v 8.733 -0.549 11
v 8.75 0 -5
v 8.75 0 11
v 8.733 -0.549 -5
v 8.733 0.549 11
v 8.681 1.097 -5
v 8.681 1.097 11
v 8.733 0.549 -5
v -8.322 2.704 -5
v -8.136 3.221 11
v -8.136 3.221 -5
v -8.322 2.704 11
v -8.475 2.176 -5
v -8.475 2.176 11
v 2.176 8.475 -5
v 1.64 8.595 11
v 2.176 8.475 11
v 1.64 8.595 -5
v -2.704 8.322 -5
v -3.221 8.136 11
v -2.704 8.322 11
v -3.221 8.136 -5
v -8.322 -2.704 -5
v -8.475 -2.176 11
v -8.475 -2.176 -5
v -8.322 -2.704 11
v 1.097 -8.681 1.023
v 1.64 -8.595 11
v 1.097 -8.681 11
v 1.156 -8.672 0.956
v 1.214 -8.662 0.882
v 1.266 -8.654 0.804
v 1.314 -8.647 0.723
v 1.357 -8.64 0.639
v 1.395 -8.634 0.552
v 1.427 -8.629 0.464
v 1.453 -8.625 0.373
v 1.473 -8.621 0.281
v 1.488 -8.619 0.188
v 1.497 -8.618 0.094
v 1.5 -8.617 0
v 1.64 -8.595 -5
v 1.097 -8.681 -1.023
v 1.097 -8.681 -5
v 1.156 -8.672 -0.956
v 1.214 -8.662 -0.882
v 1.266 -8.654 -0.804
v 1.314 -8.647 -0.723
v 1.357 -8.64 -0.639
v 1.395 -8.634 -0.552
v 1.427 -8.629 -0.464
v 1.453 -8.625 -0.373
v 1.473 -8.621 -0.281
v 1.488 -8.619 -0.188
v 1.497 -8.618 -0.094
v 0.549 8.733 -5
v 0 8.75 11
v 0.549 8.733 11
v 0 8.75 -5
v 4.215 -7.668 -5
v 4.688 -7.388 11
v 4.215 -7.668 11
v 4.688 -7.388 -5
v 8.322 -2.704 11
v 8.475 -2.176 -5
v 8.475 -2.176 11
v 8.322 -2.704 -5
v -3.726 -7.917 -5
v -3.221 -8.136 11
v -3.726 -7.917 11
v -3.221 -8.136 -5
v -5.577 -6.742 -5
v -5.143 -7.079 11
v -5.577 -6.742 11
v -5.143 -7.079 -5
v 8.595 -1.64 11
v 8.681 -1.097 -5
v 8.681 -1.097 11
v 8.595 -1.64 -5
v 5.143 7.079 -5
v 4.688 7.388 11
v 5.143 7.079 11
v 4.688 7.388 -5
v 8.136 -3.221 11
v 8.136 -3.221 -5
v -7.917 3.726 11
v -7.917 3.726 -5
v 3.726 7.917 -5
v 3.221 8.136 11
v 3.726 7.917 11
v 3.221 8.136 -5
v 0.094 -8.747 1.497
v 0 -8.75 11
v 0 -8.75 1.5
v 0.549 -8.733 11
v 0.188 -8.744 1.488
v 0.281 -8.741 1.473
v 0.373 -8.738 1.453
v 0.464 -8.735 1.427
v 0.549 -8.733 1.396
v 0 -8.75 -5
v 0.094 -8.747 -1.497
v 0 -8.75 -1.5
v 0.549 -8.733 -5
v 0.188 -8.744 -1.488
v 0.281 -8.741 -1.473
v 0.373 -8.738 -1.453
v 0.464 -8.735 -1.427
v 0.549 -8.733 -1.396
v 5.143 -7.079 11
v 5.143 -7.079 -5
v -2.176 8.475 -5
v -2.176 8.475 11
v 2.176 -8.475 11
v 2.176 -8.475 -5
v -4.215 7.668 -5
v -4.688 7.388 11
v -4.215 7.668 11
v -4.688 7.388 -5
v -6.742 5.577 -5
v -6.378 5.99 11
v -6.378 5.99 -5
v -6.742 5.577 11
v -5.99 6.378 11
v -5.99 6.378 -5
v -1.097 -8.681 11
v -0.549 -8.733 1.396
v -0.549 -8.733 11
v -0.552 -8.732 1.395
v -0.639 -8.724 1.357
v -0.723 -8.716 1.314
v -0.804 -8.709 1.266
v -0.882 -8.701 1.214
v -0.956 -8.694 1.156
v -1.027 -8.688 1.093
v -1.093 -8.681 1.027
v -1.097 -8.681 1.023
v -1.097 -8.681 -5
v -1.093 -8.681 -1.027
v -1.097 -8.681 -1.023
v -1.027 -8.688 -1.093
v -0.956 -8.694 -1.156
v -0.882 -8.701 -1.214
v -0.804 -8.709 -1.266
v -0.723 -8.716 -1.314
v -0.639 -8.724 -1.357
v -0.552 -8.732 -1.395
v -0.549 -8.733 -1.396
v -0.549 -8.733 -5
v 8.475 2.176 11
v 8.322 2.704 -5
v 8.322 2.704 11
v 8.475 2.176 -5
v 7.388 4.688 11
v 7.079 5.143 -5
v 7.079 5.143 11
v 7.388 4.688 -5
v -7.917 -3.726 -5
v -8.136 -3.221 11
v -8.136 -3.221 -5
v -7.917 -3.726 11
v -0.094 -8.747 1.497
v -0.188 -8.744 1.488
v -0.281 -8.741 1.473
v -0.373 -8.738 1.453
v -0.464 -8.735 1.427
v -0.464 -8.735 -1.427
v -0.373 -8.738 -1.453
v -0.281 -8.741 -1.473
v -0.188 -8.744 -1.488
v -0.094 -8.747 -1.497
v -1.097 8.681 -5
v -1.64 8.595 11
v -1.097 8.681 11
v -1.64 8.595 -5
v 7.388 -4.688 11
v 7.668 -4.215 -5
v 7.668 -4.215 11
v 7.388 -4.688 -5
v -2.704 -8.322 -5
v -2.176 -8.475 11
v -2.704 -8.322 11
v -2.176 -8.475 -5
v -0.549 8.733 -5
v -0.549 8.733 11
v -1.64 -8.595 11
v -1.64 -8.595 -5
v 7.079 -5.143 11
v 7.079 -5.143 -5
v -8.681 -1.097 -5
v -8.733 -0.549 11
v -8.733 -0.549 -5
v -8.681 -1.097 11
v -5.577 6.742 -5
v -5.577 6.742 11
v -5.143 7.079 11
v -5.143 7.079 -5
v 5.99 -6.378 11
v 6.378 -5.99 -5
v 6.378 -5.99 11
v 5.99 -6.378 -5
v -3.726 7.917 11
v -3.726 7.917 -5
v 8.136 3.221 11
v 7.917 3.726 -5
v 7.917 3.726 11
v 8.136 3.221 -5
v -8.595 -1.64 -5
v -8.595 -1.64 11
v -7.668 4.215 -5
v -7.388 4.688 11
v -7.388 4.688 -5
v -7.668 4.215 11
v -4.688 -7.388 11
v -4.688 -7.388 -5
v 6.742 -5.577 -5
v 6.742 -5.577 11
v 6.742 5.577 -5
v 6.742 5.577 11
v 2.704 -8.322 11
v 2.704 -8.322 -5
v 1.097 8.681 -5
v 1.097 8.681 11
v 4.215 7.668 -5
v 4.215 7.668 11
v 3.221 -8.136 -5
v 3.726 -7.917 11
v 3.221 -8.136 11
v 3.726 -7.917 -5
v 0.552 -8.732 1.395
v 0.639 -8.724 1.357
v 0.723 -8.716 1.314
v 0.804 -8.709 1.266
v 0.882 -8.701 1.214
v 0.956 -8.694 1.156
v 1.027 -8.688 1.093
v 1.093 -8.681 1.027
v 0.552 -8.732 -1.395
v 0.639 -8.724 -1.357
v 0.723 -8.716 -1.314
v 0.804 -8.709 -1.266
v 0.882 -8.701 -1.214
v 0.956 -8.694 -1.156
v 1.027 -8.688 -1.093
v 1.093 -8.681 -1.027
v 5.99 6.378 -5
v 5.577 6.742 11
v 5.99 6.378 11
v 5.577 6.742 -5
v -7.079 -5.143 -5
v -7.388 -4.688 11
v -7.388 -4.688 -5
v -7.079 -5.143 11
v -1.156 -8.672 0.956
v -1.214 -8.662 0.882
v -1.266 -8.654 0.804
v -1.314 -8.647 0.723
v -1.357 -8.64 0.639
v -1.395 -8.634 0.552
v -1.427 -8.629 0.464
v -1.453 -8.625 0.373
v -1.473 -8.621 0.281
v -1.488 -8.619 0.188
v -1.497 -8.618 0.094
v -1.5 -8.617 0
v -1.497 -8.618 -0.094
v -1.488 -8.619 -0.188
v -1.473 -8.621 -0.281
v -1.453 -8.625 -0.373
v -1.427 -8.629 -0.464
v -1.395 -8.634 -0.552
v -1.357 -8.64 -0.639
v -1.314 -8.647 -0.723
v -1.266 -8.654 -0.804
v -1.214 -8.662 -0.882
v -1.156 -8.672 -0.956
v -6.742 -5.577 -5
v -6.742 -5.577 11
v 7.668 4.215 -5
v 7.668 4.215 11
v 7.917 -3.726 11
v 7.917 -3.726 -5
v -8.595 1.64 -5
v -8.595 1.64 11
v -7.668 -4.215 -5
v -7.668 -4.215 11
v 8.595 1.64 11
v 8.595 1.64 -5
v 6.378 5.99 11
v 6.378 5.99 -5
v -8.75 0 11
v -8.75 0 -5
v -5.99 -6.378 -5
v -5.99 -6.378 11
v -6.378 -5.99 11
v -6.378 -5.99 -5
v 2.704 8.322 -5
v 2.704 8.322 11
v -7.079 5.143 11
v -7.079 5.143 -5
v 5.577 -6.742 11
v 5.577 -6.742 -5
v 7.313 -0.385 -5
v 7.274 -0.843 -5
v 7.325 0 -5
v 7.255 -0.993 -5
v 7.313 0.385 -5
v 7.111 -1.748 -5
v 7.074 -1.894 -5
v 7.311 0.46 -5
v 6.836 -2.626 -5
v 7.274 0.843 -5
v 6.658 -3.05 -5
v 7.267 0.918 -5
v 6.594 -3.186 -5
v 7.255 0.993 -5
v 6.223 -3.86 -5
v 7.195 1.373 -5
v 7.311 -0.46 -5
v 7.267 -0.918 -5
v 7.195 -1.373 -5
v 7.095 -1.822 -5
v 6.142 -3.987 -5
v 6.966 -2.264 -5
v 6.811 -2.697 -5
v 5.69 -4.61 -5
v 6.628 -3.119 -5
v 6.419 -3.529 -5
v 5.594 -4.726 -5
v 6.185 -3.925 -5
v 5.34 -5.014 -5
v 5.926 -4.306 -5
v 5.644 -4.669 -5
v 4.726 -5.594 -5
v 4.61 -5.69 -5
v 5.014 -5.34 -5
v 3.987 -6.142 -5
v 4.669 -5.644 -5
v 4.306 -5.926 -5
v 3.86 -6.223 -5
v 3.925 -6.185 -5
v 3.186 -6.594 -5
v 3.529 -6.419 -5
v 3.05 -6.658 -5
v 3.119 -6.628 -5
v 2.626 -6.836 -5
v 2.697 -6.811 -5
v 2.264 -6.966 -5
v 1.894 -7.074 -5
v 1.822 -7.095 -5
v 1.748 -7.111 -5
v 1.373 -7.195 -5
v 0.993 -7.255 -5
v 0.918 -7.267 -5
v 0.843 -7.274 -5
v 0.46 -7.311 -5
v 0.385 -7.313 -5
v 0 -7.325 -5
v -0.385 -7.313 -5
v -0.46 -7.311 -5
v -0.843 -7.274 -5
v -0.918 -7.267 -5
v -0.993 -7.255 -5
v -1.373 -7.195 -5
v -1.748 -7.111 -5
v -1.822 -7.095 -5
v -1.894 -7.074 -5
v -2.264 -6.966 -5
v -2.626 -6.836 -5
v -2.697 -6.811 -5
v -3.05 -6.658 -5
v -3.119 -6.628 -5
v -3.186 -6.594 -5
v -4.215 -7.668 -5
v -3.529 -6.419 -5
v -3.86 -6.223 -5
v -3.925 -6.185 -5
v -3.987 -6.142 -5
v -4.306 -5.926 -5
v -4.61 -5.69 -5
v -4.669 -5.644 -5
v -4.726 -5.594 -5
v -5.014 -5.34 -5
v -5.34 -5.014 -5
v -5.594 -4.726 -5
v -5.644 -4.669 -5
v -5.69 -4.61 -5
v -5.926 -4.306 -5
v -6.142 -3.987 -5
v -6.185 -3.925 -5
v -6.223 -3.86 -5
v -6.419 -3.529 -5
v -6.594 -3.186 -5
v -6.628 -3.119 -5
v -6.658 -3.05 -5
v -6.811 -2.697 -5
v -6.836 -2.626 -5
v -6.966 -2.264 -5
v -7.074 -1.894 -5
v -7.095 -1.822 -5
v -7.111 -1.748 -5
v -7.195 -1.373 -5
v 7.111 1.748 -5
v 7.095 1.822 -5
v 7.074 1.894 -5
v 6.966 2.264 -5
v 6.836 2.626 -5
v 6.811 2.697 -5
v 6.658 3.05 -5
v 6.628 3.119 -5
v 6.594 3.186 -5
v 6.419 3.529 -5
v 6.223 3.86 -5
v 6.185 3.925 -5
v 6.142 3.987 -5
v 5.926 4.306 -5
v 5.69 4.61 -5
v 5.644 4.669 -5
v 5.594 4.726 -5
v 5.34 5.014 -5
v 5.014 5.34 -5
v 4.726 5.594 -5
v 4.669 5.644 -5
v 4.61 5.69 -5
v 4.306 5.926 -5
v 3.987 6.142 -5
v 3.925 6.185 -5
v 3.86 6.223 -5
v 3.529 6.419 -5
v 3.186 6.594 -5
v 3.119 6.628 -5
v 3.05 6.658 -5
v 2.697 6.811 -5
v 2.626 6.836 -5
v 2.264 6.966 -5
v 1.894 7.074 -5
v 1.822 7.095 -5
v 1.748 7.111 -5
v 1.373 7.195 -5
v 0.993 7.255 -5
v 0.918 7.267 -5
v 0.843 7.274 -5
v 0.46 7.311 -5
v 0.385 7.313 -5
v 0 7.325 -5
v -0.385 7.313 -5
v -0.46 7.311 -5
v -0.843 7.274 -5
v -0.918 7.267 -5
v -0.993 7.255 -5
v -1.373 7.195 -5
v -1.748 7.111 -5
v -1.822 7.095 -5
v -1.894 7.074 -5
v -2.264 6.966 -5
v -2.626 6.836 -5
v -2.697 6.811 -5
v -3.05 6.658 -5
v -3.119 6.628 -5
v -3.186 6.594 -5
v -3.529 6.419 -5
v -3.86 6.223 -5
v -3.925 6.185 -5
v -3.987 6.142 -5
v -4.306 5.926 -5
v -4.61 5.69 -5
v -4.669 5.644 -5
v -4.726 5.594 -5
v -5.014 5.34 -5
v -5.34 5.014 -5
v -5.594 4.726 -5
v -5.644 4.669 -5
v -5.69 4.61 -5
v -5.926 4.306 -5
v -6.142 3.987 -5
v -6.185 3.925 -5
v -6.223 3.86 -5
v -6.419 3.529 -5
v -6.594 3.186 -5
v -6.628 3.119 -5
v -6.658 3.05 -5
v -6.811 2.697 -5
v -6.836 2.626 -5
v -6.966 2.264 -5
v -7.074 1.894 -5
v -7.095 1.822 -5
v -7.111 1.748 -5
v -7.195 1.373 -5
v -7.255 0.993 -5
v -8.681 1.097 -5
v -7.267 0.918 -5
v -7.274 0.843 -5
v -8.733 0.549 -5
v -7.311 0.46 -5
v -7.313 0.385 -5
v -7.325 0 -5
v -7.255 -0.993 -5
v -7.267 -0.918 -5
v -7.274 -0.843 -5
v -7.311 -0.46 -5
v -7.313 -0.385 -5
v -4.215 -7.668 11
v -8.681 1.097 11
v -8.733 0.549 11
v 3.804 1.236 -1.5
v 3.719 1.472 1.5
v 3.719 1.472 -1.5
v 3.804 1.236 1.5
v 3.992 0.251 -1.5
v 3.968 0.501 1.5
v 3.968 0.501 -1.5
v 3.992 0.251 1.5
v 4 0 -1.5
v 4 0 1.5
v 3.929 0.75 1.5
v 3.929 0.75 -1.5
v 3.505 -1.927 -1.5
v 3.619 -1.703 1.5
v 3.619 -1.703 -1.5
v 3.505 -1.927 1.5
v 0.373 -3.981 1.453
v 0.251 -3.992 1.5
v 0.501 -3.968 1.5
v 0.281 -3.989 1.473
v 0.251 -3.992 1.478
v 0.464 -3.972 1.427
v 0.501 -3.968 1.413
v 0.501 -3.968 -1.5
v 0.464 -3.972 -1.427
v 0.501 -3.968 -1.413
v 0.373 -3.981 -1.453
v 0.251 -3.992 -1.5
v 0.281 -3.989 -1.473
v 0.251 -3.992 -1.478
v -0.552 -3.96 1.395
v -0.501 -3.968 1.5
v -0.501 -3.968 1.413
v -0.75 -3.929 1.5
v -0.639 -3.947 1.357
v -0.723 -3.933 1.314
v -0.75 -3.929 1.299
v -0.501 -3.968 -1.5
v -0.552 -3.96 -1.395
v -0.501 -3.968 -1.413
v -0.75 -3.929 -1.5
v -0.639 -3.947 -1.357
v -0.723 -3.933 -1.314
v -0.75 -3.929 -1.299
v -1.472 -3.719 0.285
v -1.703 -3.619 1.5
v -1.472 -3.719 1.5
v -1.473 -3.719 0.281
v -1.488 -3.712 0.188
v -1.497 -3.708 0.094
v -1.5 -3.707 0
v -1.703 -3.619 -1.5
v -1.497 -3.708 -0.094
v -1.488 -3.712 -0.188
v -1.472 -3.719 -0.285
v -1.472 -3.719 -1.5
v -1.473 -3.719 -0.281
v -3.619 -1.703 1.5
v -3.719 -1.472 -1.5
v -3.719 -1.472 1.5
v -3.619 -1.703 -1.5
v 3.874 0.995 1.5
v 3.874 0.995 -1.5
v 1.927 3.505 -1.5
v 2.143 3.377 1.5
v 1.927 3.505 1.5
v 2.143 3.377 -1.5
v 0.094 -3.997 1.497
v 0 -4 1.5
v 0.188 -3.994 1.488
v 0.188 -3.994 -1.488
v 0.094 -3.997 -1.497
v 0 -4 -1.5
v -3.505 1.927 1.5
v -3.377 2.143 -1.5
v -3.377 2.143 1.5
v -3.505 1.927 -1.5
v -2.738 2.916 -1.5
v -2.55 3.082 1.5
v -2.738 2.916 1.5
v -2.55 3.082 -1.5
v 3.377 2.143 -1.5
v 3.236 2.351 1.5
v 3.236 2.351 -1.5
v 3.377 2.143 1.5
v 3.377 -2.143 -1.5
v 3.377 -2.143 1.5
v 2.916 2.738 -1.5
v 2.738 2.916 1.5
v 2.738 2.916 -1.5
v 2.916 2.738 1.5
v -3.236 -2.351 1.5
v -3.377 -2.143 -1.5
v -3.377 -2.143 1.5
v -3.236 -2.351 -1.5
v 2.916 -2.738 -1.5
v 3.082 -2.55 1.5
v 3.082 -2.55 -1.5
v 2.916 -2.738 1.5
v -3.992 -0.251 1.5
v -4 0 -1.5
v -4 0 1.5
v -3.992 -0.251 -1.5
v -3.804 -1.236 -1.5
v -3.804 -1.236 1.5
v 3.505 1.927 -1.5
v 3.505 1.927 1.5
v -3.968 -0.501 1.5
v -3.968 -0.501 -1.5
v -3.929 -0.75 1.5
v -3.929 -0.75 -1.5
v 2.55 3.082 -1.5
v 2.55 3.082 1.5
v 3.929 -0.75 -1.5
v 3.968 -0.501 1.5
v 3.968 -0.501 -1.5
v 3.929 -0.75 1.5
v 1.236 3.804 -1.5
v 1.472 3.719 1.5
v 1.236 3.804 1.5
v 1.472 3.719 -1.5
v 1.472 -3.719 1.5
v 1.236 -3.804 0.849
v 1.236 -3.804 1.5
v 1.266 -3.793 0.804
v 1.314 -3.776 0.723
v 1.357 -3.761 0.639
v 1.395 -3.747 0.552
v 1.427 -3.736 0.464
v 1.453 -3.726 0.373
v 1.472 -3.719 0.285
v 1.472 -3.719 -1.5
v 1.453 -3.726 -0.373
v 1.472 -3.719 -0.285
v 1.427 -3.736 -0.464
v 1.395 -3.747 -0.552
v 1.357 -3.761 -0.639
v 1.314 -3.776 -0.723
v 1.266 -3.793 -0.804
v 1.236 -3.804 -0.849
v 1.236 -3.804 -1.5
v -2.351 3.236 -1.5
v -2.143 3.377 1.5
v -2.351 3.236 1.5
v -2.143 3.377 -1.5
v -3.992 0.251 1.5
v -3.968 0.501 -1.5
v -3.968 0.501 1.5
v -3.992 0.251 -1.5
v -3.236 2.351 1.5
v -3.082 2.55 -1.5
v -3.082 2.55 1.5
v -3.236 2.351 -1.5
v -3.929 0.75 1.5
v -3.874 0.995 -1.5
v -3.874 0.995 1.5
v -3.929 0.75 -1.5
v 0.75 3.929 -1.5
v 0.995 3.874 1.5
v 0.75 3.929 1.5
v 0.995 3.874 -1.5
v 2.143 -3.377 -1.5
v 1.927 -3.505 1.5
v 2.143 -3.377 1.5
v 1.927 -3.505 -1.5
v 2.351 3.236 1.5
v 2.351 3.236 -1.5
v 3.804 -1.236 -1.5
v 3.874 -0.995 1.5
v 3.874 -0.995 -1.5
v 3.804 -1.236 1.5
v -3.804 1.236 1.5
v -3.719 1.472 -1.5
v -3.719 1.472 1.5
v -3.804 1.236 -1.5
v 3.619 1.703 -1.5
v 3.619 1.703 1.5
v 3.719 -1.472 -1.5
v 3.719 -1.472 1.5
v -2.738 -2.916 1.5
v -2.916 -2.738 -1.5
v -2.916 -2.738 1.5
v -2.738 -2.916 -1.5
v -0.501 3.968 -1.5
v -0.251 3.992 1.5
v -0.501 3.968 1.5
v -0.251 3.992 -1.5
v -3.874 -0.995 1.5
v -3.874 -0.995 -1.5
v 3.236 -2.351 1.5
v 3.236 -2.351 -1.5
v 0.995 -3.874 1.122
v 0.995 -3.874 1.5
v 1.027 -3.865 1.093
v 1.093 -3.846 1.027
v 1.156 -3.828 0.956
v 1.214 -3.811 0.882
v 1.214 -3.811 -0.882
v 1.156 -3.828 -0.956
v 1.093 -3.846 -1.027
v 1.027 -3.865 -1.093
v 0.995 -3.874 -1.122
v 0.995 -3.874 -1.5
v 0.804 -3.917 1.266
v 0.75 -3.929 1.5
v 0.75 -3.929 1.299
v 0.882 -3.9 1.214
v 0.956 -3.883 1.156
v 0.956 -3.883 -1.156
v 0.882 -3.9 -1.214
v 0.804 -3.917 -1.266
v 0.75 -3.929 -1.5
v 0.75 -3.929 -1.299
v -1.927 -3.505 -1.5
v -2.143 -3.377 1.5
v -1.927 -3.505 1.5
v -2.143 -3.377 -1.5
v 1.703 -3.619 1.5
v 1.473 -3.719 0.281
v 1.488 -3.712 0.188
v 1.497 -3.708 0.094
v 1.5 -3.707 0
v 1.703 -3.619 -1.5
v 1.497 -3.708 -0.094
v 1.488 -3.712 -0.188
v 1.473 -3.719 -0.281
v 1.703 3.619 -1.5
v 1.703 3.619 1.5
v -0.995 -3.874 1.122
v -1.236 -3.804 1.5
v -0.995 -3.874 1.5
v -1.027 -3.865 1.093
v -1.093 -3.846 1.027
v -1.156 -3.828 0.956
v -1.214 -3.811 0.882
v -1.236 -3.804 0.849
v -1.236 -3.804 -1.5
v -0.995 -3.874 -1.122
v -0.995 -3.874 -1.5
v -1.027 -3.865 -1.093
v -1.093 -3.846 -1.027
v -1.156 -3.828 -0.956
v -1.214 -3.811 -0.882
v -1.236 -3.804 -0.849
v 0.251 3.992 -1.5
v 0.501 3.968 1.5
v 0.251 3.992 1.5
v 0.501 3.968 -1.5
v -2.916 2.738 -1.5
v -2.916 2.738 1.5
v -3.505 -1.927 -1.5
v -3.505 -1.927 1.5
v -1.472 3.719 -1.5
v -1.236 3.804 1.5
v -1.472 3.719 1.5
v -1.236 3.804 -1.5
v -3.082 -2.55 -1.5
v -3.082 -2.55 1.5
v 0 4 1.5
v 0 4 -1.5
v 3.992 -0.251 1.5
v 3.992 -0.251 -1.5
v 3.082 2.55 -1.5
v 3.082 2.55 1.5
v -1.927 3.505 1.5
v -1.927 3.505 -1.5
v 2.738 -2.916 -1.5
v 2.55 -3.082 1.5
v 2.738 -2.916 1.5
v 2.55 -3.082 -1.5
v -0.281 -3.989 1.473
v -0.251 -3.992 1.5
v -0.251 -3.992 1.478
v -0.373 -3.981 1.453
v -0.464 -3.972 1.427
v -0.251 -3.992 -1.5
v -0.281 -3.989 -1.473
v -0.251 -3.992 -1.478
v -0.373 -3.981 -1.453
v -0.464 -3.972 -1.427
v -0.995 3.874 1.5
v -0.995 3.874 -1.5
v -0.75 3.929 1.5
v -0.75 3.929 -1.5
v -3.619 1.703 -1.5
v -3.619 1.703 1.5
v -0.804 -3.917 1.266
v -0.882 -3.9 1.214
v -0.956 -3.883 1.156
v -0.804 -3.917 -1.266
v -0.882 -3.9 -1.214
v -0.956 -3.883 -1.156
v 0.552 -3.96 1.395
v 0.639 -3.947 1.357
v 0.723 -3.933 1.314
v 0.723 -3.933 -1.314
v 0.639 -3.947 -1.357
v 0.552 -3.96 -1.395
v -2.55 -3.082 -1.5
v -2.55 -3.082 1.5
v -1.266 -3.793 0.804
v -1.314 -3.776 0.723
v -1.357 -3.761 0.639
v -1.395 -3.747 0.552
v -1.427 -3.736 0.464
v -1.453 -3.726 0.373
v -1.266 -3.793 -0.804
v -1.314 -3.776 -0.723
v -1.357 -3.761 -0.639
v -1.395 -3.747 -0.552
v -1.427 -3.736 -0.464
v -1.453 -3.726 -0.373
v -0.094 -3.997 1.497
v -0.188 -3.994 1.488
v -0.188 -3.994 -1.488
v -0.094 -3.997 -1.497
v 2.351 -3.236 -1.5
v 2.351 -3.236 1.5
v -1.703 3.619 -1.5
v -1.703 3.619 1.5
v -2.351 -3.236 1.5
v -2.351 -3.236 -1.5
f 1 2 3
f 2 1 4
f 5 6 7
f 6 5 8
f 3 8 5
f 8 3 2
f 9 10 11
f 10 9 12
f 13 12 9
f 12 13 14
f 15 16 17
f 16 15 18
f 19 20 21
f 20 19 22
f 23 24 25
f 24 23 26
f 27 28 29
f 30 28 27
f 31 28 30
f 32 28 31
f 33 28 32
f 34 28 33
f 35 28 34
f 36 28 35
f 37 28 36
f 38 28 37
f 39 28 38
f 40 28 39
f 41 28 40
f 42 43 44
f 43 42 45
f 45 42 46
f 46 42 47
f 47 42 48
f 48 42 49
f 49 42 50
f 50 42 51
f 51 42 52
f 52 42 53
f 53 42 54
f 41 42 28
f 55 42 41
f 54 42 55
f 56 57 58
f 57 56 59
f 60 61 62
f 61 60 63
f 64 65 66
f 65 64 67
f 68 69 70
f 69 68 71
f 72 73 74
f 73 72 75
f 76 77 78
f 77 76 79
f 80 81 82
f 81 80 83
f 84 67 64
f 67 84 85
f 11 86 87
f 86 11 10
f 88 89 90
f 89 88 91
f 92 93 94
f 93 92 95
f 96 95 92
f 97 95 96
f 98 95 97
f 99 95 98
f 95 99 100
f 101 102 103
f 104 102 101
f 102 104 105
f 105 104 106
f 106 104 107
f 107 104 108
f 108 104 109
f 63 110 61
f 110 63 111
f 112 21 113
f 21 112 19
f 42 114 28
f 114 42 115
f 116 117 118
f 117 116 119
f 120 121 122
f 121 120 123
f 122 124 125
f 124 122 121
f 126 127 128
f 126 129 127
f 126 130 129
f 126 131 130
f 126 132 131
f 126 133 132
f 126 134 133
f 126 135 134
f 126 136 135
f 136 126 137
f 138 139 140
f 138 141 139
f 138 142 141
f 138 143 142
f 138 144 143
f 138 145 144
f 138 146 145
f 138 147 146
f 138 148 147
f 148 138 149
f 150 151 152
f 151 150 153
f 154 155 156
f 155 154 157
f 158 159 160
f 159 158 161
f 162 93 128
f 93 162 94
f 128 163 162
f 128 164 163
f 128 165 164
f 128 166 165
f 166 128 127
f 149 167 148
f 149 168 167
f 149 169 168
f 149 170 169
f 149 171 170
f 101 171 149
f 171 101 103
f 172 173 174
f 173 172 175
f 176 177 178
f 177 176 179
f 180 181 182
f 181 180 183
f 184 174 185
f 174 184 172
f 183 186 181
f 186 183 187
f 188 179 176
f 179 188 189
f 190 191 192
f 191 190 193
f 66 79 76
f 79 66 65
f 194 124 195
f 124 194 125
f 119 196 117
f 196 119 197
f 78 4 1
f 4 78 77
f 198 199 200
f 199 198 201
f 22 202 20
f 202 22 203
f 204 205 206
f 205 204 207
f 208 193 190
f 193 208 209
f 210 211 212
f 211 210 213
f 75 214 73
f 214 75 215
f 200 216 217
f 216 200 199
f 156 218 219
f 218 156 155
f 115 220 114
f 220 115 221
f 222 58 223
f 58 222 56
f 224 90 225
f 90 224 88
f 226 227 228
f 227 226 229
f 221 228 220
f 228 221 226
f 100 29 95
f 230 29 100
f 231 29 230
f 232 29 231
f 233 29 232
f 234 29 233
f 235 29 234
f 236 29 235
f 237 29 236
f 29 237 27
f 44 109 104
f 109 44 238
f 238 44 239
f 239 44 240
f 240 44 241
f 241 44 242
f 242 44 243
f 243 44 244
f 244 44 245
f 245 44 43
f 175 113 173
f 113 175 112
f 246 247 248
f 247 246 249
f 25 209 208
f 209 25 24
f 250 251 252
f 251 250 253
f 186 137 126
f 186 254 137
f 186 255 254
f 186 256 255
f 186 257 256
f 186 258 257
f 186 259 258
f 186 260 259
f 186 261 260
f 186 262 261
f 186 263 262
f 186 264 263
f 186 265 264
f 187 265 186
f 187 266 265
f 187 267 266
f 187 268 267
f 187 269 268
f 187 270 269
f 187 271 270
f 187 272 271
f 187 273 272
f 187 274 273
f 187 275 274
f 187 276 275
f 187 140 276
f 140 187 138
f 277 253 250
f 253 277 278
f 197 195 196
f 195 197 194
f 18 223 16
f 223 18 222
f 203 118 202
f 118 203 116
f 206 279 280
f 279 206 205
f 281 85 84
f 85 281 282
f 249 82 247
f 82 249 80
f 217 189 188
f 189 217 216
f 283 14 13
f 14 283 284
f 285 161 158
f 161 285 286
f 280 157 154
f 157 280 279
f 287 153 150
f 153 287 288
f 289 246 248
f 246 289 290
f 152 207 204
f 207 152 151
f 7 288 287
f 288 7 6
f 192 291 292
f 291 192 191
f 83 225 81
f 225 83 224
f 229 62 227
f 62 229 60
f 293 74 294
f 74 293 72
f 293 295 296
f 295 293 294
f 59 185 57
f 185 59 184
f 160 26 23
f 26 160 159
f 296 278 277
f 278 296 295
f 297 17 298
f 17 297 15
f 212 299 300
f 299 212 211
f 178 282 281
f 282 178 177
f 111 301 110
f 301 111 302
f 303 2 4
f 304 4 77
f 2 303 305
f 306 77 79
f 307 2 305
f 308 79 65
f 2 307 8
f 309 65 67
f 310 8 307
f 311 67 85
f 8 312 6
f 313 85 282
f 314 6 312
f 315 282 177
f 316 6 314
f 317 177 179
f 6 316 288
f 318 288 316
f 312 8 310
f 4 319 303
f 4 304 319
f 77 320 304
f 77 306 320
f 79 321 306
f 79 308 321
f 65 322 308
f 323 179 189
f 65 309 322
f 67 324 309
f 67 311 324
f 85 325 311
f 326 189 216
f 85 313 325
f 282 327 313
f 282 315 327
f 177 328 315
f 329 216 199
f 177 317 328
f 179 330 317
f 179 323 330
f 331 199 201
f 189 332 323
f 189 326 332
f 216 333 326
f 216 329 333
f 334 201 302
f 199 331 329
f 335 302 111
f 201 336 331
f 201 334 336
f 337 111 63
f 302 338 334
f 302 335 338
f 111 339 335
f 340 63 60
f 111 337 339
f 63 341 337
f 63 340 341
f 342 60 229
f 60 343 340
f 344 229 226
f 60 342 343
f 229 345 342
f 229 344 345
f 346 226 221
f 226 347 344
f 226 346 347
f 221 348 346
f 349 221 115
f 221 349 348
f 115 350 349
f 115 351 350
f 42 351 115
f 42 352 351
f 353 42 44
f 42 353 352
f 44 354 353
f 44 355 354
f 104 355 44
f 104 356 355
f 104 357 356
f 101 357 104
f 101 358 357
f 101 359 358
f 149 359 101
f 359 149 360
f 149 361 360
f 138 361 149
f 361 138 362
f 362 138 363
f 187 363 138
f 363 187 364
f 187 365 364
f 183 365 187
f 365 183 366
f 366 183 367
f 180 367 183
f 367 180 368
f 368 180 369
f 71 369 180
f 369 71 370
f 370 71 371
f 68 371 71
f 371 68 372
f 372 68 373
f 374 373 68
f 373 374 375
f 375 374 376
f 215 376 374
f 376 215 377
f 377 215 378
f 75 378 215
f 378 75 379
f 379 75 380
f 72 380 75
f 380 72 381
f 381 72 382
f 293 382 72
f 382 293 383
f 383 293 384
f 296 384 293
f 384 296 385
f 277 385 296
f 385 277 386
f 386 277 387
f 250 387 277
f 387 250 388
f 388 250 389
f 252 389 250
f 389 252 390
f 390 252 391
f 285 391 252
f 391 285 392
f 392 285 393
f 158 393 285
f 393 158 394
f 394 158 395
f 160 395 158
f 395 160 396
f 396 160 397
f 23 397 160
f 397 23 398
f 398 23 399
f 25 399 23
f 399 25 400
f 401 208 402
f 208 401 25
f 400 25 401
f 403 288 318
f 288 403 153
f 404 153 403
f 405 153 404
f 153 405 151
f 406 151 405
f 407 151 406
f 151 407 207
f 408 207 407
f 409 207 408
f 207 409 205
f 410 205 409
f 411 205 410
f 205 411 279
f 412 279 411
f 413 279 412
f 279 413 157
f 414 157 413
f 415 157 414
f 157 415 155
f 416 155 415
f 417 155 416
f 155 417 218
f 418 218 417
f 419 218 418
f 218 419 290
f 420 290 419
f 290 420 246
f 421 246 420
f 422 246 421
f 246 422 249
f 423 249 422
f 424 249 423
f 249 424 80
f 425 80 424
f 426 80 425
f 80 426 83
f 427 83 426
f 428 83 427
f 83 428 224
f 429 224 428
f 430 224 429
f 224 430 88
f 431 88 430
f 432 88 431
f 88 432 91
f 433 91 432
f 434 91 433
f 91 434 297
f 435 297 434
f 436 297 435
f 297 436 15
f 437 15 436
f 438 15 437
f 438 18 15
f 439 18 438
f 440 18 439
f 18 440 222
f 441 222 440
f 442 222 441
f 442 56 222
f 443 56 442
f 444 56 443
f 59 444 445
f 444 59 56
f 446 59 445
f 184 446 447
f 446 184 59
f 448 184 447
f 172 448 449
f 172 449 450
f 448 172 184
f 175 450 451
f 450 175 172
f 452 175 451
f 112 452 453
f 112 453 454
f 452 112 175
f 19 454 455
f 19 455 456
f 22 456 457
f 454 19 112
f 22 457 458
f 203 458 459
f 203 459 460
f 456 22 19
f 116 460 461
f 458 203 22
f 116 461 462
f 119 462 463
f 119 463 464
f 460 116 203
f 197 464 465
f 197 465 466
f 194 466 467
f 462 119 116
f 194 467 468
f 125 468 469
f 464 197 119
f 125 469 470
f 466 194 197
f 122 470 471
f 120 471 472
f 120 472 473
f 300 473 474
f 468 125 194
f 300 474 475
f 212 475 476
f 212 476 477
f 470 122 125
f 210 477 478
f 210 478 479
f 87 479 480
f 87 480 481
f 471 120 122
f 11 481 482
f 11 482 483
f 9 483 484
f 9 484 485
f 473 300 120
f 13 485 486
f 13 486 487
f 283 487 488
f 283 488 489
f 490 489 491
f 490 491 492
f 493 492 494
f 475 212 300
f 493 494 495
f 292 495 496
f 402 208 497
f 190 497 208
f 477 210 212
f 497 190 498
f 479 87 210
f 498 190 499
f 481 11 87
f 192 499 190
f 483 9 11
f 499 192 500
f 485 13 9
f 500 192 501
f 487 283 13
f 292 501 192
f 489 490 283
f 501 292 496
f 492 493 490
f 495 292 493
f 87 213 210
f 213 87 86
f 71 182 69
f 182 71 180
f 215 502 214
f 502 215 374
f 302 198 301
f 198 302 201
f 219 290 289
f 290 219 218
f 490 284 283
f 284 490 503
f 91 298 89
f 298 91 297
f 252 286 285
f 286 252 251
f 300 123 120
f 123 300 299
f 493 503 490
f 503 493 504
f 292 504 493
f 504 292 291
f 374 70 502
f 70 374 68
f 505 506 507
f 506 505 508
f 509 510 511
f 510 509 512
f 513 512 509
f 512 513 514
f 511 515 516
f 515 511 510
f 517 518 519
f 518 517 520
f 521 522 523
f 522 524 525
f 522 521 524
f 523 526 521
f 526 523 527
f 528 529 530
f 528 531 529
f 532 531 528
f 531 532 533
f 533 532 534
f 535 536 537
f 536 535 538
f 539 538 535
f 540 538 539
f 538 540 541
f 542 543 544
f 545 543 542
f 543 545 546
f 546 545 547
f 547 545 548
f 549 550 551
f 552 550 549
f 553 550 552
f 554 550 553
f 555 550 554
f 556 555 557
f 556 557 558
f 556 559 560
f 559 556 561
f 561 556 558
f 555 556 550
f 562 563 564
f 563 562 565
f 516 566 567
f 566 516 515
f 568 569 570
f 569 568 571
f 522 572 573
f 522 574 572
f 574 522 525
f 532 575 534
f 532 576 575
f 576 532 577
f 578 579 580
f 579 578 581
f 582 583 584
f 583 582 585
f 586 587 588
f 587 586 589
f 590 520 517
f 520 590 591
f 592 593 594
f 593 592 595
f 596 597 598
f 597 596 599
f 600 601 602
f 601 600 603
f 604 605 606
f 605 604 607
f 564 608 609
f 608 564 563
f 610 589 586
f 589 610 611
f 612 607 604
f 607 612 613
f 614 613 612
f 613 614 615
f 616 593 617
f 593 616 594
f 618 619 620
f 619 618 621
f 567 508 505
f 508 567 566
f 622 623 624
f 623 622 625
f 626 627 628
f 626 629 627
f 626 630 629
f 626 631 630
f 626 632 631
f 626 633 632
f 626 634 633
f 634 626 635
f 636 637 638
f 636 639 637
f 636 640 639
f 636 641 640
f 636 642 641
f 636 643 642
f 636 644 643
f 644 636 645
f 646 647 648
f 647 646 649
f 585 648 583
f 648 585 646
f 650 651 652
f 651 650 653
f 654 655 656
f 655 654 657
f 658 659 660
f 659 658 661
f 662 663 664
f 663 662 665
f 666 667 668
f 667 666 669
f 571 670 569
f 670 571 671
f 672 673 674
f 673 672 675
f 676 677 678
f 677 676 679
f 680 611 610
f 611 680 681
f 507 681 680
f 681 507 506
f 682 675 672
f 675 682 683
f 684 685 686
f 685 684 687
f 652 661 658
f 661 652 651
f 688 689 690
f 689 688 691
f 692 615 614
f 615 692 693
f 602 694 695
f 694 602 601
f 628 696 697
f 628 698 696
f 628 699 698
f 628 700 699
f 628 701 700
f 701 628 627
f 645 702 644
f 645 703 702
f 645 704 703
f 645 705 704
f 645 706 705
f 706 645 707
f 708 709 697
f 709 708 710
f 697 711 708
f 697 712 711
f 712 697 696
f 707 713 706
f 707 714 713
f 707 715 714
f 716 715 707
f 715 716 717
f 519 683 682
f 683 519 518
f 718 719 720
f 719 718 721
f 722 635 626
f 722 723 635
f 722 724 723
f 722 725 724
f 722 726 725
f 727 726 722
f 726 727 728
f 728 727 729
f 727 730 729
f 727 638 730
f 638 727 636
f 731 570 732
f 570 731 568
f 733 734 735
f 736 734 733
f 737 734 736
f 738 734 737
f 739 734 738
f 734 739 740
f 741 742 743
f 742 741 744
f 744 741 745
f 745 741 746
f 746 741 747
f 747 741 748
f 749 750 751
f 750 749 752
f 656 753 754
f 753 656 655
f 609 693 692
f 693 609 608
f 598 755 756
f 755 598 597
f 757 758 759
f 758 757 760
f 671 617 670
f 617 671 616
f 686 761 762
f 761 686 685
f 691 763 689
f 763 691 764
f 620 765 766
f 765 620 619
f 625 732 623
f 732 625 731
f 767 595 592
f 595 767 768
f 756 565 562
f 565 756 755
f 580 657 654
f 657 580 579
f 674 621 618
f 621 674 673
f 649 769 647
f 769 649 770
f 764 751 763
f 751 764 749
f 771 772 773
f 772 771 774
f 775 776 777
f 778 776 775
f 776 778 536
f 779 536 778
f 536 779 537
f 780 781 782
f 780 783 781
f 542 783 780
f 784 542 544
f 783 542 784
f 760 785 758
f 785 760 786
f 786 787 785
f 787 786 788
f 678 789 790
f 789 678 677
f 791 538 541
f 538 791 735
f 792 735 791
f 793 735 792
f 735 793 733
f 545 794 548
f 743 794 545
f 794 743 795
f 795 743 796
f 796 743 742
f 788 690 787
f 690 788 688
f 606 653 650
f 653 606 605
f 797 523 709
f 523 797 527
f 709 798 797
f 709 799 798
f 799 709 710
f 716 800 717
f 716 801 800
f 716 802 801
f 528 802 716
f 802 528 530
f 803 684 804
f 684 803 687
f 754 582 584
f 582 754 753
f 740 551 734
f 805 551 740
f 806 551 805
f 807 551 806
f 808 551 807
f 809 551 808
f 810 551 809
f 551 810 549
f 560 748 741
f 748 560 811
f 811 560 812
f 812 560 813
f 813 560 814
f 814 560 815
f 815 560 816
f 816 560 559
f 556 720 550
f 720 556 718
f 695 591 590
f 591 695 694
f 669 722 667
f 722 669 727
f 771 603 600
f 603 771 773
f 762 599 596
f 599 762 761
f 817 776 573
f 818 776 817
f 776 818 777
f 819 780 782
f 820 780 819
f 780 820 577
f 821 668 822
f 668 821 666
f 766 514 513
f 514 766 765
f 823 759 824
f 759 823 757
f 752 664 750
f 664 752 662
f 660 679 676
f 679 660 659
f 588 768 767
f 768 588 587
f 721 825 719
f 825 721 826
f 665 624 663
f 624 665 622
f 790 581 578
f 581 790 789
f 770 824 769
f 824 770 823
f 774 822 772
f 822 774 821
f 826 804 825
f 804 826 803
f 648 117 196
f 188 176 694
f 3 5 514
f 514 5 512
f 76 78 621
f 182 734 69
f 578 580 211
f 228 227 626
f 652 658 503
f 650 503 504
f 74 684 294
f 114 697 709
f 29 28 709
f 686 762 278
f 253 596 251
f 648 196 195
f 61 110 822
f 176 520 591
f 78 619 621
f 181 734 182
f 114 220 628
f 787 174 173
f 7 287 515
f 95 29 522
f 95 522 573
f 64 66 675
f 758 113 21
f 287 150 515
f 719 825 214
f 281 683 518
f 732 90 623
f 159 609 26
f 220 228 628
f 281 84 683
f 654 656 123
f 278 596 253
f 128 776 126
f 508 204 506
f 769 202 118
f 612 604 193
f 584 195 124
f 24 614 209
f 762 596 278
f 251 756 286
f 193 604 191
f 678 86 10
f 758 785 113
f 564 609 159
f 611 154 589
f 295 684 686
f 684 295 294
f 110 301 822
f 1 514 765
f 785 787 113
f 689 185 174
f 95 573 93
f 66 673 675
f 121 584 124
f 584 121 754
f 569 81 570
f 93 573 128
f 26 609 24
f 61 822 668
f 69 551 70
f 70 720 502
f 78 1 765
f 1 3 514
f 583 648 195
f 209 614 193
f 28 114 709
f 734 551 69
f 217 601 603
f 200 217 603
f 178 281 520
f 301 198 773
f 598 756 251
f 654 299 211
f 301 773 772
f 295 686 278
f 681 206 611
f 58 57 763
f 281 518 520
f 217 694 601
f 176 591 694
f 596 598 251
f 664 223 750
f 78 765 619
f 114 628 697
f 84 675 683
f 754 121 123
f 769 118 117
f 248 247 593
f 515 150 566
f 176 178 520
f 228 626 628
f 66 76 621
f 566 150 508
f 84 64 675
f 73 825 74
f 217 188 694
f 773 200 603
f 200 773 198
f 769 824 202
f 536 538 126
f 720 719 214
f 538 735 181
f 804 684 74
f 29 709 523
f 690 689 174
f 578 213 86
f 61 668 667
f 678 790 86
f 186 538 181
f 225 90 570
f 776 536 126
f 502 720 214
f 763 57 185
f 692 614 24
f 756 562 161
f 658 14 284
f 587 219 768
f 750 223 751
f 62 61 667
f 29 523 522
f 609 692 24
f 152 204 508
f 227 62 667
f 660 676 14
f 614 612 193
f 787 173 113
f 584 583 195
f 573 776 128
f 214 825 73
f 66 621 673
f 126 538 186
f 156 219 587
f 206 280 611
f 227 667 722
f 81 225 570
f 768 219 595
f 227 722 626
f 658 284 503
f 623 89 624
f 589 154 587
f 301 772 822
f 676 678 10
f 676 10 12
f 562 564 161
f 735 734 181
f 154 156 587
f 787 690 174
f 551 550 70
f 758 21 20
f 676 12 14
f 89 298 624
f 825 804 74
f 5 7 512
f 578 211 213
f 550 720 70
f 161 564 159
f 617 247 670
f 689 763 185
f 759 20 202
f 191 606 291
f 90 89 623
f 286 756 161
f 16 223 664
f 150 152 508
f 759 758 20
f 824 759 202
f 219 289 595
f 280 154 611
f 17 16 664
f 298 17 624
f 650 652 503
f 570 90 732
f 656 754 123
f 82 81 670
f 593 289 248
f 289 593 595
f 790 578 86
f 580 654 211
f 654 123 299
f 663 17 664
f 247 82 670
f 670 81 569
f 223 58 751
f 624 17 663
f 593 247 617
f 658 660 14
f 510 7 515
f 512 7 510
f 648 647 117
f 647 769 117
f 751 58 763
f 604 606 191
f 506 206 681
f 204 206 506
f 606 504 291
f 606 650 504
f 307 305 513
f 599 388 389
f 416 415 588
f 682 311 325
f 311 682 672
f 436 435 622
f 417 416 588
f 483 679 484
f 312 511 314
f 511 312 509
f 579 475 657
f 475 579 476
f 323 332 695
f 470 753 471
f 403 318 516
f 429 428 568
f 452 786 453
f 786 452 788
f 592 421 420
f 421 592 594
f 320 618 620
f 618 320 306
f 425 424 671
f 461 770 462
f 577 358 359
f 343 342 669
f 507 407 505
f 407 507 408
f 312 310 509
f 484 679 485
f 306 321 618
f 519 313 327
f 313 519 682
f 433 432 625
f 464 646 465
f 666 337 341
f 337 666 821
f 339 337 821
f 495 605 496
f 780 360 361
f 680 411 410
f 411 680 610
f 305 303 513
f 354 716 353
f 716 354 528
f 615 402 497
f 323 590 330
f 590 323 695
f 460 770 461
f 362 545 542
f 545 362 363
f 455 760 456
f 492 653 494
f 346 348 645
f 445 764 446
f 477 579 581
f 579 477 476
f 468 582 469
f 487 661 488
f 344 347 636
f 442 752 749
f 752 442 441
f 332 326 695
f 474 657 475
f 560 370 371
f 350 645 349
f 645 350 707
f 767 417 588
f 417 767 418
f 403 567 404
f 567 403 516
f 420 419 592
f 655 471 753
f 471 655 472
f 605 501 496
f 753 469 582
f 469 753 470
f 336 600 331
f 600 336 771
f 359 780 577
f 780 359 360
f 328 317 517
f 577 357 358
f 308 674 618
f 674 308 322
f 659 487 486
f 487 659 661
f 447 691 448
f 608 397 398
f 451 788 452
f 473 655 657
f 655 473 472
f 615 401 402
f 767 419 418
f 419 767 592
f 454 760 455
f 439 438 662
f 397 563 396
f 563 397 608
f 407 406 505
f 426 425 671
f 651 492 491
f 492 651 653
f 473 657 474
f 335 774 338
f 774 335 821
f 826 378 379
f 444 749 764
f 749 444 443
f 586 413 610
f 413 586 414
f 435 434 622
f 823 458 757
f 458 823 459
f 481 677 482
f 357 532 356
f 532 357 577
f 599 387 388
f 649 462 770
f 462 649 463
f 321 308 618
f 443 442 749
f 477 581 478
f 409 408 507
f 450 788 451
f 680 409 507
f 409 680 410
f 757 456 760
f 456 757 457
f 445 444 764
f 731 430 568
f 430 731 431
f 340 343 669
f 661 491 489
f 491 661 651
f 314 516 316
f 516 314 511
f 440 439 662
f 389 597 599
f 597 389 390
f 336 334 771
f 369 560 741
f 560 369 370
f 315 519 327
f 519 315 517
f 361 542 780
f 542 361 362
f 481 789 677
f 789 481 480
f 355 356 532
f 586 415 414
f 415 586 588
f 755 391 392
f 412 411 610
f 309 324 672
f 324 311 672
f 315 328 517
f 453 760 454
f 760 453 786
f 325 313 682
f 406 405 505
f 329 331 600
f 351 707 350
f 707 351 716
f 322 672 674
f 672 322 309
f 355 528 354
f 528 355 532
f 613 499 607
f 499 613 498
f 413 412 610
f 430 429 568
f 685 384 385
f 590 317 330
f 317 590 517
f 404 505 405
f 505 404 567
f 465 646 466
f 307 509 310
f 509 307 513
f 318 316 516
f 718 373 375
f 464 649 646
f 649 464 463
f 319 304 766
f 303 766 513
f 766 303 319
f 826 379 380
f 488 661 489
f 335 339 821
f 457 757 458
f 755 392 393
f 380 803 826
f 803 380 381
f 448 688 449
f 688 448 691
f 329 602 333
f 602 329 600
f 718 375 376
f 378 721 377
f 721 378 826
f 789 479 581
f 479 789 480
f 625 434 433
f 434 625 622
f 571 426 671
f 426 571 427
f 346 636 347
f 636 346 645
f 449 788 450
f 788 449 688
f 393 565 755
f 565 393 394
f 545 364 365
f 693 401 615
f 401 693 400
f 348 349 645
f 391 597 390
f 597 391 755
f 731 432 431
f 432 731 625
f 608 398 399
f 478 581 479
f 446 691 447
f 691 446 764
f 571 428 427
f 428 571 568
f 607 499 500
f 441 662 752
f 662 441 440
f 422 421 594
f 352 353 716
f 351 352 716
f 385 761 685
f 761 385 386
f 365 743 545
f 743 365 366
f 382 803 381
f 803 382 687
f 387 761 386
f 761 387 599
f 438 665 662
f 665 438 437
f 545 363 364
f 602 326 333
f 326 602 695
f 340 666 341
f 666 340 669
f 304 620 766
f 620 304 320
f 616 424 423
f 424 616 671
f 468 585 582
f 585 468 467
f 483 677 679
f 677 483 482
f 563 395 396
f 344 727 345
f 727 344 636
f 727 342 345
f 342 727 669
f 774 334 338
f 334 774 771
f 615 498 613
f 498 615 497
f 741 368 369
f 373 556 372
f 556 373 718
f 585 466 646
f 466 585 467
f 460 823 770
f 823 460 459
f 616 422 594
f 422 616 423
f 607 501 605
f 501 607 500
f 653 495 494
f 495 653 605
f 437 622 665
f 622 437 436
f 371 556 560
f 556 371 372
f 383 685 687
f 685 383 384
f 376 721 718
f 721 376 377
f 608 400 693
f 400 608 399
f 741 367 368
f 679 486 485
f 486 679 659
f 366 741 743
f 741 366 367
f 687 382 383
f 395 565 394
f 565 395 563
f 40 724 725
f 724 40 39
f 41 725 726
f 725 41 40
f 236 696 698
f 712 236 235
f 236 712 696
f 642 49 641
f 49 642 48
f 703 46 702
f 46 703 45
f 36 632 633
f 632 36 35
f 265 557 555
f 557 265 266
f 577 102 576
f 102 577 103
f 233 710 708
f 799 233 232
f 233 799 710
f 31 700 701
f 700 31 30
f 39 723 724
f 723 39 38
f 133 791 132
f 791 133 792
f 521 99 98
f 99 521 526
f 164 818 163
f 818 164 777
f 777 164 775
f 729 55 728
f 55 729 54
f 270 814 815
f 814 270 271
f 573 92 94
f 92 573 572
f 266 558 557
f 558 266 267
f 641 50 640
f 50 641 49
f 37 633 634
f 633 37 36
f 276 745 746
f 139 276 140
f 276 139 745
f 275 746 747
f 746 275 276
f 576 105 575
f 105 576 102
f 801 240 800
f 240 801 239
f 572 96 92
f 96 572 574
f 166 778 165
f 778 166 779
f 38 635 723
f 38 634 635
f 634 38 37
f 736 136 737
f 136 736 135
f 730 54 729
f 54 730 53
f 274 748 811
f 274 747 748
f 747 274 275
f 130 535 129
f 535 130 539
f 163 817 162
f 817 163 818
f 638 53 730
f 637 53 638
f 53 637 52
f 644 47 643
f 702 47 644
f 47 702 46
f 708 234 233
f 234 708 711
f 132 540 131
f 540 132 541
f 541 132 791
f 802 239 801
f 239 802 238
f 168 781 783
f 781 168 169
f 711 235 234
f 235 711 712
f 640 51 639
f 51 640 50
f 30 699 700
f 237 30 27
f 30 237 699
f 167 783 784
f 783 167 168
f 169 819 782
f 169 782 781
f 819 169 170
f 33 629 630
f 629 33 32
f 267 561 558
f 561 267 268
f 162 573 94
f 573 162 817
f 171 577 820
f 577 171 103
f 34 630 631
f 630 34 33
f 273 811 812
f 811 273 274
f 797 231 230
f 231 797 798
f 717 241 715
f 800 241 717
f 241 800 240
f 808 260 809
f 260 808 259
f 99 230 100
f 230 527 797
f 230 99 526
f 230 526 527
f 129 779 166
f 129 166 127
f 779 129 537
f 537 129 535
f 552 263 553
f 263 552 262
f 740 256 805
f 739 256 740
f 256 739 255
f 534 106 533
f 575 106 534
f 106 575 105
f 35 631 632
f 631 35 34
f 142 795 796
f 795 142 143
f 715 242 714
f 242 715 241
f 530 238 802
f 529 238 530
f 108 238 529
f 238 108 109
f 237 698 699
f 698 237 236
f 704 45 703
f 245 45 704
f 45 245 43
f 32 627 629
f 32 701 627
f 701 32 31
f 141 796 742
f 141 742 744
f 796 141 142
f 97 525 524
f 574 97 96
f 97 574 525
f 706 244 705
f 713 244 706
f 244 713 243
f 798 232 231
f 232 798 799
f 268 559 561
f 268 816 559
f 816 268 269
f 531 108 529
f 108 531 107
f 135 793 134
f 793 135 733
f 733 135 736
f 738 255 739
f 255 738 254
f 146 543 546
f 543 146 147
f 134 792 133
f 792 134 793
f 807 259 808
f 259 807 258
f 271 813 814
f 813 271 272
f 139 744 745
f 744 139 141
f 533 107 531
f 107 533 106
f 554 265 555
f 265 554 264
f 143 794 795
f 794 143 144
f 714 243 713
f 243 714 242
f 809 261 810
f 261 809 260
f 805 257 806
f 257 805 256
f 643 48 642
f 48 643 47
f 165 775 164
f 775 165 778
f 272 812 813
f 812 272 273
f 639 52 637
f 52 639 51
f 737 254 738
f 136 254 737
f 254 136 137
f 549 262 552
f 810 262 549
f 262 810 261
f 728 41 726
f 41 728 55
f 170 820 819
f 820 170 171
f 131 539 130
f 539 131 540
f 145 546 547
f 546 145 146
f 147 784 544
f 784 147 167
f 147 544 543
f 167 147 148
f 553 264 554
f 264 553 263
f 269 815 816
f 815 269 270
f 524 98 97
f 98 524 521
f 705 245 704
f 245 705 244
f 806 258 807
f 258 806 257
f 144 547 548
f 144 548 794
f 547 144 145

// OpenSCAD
$fn = 100;

thickness = 0.8;

h = 11;
d1 = 17.5;
d2 = 8;

holes = 13;

// connector();
tube();

module tube() difference() {
    difference() {
        translate([0, 0, -5]) cylinder(h = h+5, d = d1);
        cylinder(h = 999, d = d2, center = true);
        translate([0, 0, 3/2]) cylinder(h = h-3/2, d1 = d2, d2 = d1);
        translate([0, 0, -5-3/2]) cylinder(h = 5, d1 = d1, d2 = d2);
    }
    translate([0,0, 0]) rotate([90, 0]) cylinder(h = 99, d = 3);
}

module connector() {
    ring(h = 5+5, d1 = 3, d2 = 3-0.8*2, $fn = 50);
    ring(h = 5, d1 = 6, d2 = 3-0.8*2, $fn = 50);
}


module ring(h, d1, d2) difference() {
    cylinder(h = h, d = d1);
    cylinder(h = h, d = d2);
}
